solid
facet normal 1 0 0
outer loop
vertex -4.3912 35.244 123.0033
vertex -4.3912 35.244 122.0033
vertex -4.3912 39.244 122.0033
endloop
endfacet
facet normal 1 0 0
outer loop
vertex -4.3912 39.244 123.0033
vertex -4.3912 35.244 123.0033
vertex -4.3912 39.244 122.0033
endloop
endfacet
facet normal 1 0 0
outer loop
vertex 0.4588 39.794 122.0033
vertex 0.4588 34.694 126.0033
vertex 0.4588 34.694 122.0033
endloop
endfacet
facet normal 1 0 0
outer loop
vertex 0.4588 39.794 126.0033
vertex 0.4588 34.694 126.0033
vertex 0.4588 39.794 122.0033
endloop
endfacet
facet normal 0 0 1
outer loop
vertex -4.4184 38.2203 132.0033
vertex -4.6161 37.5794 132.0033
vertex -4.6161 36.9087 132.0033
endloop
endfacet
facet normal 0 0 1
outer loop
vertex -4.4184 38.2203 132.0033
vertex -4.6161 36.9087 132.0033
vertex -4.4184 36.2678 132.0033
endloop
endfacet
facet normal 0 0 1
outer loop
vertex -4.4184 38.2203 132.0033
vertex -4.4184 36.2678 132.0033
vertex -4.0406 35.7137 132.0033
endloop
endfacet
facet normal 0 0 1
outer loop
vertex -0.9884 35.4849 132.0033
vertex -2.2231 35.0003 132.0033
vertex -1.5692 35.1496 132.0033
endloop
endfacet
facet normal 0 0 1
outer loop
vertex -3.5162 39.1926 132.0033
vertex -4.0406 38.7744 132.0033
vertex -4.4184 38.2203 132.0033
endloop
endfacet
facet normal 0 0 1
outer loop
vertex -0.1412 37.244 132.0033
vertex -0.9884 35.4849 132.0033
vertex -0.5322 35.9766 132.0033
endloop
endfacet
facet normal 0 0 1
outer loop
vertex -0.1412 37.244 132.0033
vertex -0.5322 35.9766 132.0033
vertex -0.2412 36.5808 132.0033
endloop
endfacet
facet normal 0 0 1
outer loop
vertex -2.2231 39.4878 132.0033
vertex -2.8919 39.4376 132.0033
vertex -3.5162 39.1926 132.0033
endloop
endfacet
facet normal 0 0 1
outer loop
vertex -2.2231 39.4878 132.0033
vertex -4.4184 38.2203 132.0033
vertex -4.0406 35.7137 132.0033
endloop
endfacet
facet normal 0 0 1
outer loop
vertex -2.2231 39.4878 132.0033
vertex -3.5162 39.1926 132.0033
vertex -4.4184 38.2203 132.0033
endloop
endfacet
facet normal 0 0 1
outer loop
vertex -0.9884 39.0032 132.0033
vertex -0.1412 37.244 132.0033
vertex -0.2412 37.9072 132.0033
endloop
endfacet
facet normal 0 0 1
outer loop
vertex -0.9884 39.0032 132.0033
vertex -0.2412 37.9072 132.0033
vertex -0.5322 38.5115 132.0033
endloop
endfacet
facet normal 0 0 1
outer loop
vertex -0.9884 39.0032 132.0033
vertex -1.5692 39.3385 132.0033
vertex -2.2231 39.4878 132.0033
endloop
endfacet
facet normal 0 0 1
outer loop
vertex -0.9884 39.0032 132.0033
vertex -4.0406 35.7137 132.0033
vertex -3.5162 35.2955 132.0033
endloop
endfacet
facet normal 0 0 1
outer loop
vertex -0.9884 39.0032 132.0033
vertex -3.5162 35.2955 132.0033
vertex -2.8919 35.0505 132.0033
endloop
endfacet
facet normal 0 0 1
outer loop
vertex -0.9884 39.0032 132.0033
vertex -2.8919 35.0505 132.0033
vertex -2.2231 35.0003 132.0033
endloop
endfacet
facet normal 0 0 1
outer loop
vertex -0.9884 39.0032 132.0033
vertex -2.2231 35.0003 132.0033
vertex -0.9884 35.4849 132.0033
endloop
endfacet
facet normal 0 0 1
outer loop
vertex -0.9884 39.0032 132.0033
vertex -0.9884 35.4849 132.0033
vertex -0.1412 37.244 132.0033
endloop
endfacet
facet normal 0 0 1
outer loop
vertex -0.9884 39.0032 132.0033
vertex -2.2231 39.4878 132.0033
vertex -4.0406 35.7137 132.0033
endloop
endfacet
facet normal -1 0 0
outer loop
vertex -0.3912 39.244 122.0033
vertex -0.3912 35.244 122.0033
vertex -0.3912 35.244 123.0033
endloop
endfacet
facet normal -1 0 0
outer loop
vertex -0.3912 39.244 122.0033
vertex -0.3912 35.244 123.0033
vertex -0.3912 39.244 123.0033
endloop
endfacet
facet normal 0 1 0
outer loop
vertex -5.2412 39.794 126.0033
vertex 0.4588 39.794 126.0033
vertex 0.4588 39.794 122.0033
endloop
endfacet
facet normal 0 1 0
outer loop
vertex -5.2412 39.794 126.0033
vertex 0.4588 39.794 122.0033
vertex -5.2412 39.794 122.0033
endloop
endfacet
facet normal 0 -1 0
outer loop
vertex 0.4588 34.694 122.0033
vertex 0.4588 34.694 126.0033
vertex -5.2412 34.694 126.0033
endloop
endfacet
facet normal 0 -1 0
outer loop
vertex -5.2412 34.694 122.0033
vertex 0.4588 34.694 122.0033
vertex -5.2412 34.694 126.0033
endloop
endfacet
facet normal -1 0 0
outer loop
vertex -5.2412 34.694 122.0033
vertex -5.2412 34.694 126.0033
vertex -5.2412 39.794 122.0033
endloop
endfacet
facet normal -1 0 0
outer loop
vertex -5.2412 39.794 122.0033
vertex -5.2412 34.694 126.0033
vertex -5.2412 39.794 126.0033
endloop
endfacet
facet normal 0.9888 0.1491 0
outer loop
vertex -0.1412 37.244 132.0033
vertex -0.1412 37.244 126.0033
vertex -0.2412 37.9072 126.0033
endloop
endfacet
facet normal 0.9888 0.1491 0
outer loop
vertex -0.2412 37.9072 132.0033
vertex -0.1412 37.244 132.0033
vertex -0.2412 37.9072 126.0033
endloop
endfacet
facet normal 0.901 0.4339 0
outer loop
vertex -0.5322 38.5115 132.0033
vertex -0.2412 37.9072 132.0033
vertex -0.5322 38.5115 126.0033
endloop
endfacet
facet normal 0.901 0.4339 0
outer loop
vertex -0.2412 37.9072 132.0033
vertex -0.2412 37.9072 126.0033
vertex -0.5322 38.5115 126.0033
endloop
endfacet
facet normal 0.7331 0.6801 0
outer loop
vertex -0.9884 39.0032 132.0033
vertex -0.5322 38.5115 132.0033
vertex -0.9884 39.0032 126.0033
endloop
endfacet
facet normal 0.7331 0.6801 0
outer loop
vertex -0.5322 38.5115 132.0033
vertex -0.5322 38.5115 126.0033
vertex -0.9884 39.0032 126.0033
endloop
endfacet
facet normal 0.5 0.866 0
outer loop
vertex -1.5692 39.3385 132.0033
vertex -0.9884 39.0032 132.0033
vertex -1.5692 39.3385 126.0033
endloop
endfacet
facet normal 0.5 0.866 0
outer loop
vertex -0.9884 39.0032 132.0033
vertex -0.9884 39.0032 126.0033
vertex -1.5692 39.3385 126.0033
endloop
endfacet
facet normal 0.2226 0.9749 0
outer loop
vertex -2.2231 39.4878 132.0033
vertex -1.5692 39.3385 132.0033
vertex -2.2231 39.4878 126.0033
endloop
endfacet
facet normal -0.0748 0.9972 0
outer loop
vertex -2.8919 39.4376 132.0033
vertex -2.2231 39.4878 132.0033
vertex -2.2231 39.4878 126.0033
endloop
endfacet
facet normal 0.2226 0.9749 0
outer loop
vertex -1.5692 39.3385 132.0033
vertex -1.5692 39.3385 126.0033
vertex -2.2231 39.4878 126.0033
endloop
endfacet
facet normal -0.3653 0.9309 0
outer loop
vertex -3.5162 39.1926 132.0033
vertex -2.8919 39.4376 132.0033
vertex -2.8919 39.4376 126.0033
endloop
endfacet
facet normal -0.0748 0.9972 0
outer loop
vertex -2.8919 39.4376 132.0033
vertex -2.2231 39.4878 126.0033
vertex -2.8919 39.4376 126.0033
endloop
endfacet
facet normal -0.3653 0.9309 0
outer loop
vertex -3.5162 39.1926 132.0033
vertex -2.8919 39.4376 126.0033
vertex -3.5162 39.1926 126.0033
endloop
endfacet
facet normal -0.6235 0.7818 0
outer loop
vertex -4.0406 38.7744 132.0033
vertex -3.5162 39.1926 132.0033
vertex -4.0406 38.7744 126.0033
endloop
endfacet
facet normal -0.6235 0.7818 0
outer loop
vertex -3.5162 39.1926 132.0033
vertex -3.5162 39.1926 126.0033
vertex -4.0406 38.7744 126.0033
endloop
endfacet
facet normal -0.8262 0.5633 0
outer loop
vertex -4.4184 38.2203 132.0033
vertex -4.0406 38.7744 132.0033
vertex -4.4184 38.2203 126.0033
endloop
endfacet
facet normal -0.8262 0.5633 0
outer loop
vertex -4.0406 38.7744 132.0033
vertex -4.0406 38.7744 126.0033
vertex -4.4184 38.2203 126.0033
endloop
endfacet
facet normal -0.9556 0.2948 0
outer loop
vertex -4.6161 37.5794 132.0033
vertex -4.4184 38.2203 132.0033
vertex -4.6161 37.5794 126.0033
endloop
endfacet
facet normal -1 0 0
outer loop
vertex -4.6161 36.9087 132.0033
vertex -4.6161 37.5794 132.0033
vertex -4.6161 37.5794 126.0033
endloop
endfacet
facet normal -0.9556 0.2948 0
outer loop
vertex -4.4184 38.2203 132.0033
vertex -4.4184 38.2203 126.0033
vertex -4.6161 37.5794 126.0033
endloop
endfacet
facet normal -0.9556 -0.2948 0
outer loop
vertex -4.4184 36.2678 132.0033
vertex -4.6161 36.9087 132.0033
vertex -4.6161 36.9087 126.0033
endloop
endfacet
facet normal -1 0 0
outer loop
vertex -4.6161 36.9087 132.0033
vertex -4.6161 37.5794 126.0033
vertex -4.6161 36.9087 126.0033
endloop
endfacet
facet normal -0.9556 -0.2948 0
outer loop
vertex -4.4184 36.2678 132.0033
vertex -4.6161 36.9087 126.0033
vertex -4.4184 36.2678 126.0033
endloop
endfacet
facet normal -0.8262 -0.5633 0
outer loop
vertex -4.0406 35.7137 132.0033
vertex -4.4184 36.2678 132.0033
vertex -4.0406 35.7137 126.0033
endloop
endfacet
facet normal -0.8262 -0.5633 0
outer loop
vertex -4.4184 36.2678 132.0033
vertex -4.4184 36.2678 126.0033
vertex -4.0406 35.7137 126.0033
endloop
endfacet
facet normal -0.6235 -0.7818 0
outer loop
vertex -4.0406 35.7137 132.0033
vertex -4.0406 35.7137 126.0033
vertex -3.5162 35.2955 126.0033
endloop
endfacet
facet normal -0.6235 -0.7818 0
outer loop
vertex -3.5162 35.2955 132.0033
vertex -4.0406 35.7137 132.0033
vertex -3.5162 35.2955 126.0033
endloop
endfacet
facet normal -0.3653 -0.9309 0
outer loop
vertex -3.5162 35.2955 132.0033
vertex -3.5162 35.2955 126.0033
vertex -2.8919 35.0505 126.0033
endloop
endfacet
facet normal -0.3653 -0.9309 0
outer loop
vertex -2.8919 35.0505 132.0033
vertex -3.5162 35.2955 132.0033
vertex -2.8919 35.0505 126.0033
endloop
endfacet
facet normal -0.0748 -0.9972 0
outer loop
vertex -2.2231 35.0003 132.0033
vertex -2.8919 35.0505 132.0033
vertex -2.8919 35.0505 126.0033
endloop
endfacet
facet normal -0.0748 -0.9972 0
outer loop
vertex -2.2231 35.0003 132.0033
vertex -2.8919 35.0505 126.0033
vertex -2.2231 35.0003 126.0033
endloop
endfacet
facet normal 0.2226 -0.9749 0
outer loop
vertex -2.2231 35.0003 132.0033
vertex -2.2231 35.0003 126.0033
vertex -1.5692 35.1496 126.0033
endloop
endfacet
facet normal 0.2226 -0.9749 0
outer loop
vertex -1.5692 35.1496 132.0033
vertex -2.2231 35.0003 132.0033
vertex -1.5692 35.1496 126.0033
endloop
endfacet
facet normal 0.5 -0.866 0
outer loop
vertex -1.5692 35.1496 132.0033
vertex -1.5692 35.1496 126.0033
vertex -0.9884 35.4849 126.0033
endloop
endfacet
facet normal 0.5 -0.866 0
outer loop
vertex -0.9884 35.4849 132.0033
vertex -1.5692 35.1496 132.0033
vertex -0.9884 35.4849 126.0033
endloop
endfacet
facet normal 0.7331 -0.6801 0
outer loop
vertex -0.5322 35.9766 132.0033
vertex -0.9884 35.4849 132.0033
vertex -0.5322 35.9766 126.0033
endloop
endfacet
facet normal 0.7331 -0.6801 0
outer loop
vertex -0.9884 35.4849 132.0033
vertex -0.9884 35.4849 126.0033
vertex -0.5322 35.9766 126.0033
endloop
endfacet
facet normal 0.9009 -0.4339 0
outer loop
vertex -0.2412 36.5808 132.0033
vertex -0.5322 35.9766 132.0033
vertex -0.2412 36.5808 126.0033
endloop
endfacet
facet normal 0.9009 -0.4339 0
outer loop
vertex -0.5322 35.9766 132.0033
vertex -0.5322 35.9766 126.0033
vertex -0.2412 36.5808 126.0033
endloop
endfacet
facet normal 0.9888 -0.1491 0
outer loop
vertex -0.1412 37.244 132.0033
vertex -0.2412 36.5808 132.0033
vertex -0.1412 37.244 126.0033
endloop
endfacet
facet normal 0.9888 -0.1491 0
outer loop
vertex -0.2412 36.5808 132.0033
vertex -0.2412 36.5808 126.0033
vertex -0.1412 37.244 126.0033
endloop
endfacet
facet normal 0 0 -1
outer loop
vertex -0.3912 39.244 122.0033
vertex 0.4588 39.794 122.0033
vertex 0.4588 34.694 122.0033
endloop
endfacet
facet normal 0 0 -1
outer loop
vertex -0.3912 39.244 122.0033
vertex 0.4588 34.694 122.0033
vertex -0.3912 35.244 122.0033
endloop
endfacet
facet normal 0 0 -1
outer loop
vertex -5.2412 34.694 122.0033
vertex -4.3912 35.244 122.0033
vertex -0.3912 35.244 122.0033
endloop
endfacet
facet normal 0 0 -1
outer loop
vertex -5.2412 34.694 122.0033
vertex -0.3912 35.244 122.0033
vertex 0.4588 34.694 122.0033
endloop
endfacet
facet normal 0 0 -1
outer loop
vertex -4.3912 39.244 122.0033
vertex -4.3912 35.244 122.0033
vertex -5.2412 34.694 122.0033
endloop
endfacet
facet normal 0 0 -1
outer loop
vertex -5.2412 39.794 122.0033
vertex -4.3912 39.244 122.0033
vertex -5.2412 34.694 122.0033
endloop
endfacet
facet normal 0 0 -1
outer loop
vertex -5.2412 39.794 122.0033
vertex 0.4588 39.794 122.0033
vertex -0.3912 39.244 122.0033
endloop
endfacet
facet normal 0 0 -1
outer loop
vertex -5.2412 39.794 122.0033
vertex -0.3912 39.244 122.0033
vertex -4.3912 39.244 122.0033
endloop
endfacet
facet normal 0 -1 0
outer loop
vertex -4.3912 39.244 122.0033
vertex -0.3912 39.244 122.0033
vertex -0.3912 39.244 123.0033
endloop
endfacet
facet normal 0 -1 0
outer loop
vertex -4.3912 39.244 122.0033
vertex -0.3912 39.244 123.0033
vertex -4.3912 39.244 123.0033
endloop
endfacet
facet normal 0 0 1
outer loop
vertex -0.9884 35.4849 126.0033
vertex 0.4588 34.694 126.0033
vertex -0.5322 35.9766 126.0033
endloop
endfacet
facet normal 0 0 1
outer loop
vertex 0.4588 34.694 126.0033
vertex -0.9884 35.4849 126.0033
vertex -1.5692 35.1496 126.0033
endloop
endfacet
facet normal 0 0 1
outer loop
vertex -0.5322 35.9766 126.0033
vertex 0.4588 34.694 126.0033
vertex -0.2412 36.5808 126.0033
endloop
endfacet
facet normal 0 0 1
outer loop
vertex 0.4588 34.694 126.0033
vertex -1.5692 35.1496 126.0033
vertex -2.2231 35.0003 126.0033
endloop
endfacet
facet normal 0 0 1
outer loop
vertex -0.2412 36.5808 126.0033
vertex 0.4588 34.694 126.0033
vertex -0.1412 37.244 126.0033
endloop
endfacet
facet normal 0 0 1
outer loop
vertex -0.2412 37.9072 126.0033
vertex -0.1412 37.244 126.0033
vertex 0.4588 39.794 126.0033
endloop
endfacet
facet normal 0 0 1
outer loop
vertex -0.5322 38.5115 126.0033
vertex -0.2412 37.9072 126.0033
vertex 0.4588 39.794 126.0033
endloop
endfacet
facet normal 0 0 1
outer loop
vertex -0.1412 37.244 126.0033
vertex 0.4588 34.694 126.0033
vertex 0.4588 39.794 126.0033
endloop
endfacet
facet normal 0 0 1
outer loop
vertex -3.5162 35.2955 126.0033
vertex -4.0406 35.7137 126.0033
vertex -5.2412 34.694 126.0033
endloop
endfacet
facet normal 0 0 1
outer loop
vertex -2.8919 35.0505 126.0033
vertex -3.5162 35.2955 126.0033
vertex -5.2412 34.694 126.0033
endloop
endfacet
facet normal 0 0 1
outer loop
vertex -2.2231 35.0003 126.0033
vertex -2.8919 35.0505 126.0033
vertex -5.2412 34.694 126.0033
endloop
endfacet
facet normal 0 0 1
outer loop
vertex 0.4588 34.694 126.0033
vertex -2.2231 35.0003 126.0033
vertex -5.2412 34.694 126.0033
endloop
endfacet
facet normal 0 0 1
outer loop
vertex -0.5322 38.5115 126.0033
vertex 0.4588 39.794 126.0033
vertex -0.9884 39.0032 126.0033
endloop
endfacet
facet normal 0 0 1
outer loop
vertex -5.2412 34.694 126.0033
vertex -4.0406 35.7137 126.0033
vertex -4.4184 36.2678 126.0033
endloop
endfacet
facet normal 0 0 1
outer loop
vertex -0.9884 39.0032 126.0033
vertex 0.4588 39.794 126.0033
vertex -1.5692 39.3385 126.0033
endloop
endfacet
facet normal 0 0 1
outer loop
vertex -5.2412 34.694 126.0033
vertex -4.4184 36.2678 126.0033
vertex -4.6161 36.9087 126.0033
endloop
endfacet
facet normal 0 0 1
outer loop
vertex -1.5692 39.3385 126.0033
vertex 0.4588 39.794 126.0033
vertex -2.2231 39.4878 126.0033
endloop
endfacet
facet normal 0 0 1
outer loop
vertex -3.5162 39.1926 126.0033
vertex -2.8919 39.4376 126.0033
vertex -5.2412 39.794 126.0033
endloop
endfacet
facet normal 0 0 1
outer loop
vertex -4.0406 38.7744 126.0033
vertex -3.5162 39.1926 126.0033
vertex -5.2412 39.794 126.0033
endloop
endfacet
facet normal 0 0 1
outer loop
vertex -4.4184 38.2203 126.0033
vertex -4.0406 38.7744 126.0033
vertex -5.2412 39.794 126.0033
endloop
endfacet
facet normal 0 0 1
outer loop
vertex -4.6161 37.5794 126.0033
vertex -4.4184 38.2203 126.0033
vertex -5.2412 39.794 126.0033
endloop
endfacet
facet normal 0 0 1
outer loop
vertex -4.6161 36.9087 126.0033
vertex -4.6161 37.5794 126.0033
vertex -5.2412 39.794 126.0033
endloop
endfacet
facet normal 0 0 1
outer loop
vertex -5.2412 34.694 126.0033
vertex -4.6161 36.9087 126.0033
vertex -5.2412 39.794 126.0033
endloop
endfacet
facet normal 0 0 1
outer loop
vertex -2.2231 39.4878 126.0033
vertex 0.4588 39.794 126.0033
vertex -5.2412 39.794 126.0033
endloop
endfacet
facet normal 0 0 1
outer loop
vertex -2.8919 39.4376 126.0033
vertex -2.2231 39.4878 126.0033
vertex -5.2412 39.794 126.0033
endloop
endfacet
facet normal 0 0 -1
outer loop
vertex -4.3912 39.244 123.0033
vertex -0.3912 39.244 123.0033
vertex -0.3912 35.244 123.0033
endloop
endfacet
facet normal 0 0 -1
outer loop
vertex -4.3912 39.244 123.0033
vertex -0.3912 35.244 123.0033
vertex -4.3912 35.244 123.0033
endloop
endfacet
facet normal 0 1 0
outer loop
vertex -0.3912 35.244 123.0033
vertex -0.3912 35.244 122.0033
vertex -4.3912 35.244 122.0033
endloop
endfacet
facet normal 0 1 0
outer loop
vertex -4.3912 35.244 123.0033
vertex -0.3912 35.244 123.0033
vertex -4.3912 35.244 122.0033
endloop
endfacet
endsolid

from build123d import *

# Parameters (mm, degrees)
SCHIZZO1_W                   = 5.699999879
SCHIZZO1_H                   = 5.099999898
ESTRUSIONE_ESTRUSIONE1_DEPTH = 4
SCHIZZO2_W                   = 4
SCHIZZO2_H                   = 4
TAGLIO_ESTRUSIONE1_DEPTH     = 1
SCHIZZO3_R                   = 2.25
ESTRUSIONE_ESTRUSIONE2_DEPTH = 6


with BuildPart() as part:
    # Schizzo1 → Estrusione-Estrusione1 (new body)
    with BuildSketch(Plane(origin=(0, 0, 126.00326253), x_dir=(-1, 0, 0), z_dir=(0, 0, -1))):
        with Locations((2.391212038, 37.24404717)):
            Rectangle(SCHIZZO1_W, SCHIZZO1_H)
    extrude(amount=ESTRUSIONE_ESTRUSIONE1_DEPTH)

    # Schizzo2 → Taglio-Estrusione1 (cut)
    with BuildSketch(Plane(origin=(0, 0, 122.00326253), x_dir=(-1, 0, 0), z_dir=(0, 0, -1))):
        with Locations((2.391212098, 37.244047119)):
            Rectangle(SCHIZZO2_W, SCHIZZO2_H)
    extrude(amount=-TAGLIO_ESTRUSIONE1_DEPTH, mode=Mode.SUBTRACT)

    # Schizzo3 → Estrusione-Estrusione2 (add)
    with BuildSketch(Plane.XY.offset(126.00326253)):
        with Locations((-2.391212038, 37.24404717)):
            Circle(SCHIZZO3_R)
    extrude(amount=ESTRUSIONE_ESTRUSIONE2_DEPTH)


solid = part.part
